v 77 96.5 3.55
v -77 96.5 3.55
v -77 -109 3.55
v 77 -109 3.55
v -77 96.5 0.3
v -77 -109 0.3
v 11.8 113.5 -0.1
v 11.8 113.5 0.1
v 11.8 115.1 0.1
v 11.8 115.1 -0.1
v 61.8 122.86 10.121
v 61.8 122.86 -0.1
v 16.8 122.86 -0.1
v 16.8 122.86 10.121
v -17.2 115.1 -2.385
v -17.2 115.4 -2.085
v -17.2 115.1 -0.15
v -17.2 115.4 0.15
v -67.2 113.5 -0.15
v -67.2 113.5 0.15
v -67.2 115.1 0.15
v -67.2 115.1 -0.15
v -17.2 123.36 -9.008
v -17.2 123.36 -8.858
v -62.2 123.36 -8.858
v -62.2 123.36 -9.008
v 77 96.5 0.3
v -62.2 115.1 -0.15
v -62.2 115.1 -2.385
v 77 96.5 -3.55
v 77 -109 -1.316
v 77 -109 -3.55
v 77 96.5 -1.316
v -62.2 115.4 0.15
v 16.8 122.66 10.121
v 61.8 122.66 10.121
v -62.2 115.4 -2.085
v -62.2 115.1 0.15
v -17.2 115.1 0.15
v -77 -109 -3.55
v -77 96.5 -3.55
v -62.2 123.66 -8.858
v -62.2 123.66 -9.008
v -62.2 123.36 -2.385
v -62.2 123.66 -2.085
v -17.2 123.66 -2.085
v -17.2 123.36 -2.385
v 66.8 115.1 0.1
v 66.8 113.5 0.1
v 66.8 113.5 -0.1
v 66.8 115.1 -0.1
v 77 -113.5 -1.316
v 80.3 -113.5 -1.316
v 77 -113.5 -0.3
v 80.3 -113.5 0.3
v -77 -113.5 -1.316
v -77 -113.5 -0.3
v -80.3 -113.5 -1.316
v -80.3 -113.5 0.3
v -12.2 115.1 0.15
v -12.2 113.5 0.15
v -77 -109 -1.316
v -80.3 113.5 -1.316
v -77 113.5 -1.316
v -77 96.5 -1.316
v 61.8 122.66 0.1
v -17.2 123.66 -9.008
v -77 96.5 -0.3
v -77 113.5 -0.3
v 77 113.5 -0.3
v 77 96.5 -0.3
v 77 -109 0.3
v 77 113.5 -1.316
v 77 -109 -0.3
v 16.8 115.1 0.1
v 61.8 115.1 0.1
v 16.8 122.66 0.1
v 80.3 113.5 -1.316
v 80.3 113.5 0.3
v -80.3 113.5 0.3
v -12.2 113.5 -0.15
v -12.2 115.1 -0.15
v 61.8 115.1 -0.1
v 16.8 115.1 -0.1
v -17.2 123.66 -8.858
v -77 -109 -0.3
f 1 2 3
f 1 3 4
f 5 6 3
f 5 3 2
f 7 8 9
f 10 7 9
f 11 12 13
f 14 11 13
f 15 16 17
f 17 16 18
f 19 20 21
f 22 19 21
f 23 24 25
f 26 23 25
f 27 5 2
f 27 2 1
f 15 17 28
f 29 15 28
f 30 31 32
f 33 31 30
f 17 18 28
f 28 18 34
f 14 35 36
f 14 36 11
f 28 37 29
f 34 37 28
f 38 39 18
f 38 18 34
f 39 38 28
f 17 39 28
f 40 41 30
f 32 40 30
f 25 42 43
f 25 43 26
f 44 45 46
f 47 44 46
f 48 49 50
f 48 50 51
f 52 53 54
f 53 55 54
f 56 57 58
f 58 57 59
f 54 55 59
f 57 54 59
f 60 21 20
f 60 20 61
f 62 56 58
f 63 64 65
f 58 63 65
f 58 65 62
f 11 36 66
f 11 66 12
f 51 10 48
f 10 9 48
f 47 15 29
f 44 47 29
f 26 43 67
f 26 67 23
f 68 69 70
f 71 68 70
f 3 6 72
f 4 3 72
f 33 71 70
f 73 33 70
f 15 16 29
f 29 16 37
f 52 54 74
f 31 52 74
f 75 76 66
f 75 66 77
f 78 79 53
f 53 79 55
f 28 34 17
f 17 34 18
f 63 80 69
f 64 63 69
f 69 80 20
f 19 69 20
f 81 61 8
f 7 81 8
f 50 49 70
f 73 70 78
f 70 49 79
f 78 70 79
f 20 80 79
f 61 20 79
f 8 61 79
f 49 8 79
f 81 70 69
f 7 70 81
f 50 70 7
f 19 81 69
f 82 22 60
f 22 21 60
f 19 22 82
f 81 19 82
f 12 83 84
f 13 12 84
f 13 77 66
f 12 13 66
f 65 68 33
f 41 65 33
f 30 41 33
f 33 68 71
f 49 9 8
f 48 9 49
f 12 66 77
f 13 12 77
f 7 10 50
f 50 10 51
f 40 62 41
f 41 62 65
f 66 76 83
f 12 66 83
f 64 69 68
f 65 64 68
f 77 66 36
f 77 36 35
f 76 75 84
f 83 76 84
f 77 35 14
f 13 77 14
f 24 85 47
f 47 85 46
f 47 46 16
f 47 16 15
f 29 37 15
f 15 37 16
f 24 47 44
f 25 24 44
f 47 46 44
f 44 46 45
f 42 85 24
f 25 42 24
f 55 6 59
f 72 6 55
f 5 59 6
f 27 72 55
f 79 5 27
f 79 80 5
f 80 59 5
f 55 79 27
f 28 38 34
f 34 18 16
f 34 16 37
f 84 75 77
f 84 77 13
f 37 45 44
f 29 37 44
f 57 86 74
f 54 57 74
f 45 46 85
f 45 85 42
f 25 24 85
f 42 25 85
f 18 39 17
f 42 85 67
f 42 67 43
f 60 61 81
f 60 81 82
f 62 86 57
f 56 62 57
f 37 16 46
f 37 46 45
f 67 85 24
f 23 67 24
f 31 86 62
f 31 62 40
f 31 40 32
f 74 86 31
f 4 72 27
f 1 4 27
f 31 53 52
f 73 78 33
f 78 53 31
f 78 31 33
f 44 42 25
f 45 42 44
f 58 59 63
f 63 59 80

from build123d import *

# Parameters (mm, degrees)
SKETCH1_W                    = 160.6
SKETCH1_H                    = 227
INSULATION_DEPTH             = 0.3
INSULATION_DEPTH_BACK        = 0.3
SKETCH2_W                    = 154
SKETCH2_H                    = 205.5
MAIN_BODY_DEPTH              = 3.55
MAIN_BODY_DEPTH_BACK         = 3.55
SIDE_FOLDS_DEPTH             = 1.016
SKETCH6_W                    = 55
SKETCH6_H                    = 18.6
NEGATIVE_TAB_BASE_DEPTH      = 0.1
NEGATIVE_TAB_BASE_DEPTH_BACK = 0.1
SKETCH7_W                    = 55
SKETCH7_H                    = 18.6
POSITIVE_TAB_BASE_DEPTH      = 0.15
POSITIVE_TAB_BASE_DEPTH_BACK = 0.15
SKETCH113_W                  = 0.2
SKETCH113_H                  = 45
NEGATIVE_TAB_DEPTH           = 31.160222221
SKETCH113_ON_SEGMENT_2_W     = 0.2
SKETCH113_ON_SEGMENT_2_H     = 45
NEGATIVE_TAB_2_DEPTH         = 33.621222221
SKETCH110_W                  = 0.3
SKETCH110_H                  = 45
POSITIVE_TAB_DEPTH           = 23.650499994
SKETCH110_ON_SEGMENT_2_W     = 0.3
SKETCH110_ON_SEGMENT_2_H     = 45
POSITIVE_TAB_2_DEPTH         = 49.236449989
SKETCH110_ON_SEGMENT_3_W     = 0.3
SKETCH110_ON_SEGMENT_3_H     = 45
POSITIVE_TAB_3_DEPTH         = 55.260999989
SKETCH110_ON_SEGMENT_4_W     = 0.3
SKETCH110_ON_SEGMENT_4_H     = 45
POSITIVE_TAB_4_DEPTH         = 31.122574994
SKETCH110_ON_SEGMENT_5_W     = 0.3
SKETCH110_ON_SEGMENT_5_H     = 45
POSITIVE_TAB_5_DEPTH         = 1.15


with BuildPart() as part:
    # Sketch1 → Insulation (new, two sides)
    with BuildSketch(Plane.XY) as insulation_sk:
        Rectangle(SKETCH1_W, SKETCH1_H)
    extrude(amount=INSULATION_DEPTH)
    extrude(insulation_sk.sketch, amount=-INSULATION_DEPTH_BACK)

    # Sketch2 → Main Body (add, two sides)
    with BuildSketch(Plane.XY) as main_body_sk:
        with Locations((0, -6.25)):
            Rectangle(SKETCH2_W, SKETCH2_H)
    extrude(amount=MAIN_BODY_DEPTH)
    extrude(main_body_sk.sketch, amount=-MAIN_BODY_DEPTH_BACK)

    # Sketch5 → Side Folds (add)
    with BuildSketch(Plane(origin=(0, 0, -0.3), x_dir=(-1, 0, 0), z_dir=(0, 0, -1))):
        Polygon((-77, -109), (-77, 96.5), (-77, 113.5), (-80.3, 113.5), (-80.3, -113.5), (-77, -113.5), align=None)
        Polygon((77, 113.5), (77, 96.5), (77, -109), (77, -113.5), (80.3, -113.5), (80.3, 113.5), align=None)
    extrude(amount=SIDE_FOLDS_DEPTH)

    # Sketch6 → Negative Tab Base (add, two sides)
    with BuildSketch(Plane.XY) as negative_tab_base_sk:
        with Locations((39.3, 105.8)):
            Rectangle(SKETCH6_W, SKETCH6_H)
    extrude(amount=NEGATIVE_TAB_BASE_DEPTH)
    extrude(negative_tab_base_sk.sketch, amount=-NEGATIVE_TAB_BASE_DEPTH_BACK)

    # Sketch7 → Positive Tab Base (add, two sides)
    with BuildSketch(Plane.XY) as positive_tab_base_sk:
        with Locations((-39.7, 105.8)):
            Rectangle(SKETCH7_W, SKETCH7_H)
    extrude(amount=POSITIVE_TAB_BASE_DEPTH)
    extrude(positive_tab_base_sk.sketch, amount=-POSITIVE_TAB_BASE_DEPTH_BACK)


with BuildPart() as body_2:
    # Sketch113 → Negative Tab (new body)
    with BuildSketch(Plane(origin=(39.3, 115.1, 0), x_dir=(0, 0, -1), z_dir=(0, 1, 0))):
        Rectangle(SKETCH113_W, SKETCH113_H)
    extrude(amount=NEGATIVE_TAB_DEPTH)

    # Negative Tab mitre 1
    split(bisect_by=Plane(origin=(39.3, 122.76, 0), x_dir=(1, 0, 0), z_dir=(0, -0.707106781, -0.707106781)), keep=Keep.TOP)


with BuildPart() as body_3:
    # Sketch113 on segment 2 (carried to segment 2) → Negative Tab 2 (new body)
    with BuildSketch(Plane(origin=(39.3, 122.76, -23.500222221), x_dir=(0, 1, 0), z_dir=(0, 0, 1))):
        Rectangle(SKETCH113_ON_SEGMENT_2_W, SKETCH113_ON_SEGMENT_2_H)
    extrude(amount=NEGATIVE_TAB_2_DEPTH)

    # Negative Tab 2 mitre 1
    split(bisect_by=Plane(origin=(39.3, 122.76, 0), x_dir=(-1, 0, 0), z_dir=(0, 0.707106781, 0.707106781)), keep=Keep.TOP)


with BuildPart() as body_4:
    # Sketch110 → Positive Tab (new body)
    with BuildSketch(Plane(origin=(-39.7, 115.1, 0), x_dir=(0, 0, -1), z_dir=(0, 1, 0))):
        Rectangle(SKETCH110_W, SKETCH110_H)
    extrude(amount=POSITIVE_TAB_DEPTH)

    # Positive Tab mitre 1
    split(bisect_by=Plane(origin=(-39.7, 115.25, 0), x_dir=(1, 0, 0), z_dir=(0, -0.707106781, 0.707106781)), keep=Keep.TOP)


with BuildPart() as body_5:
    # Sketch110 on segment 2 (carried to segment 2) → Positive Tab 2 (new body)
    with BuildSketch(Plane(origin=(-39.7, 115.25, 23.500499994), x_dir=(0, -1, 0), z_dir=(0, 0, -1))):
        Rectangle(SKETCH110_ON_SEGMENT_2_W, SKETCH110_ON_SEGMENT_2_H)
    extrude(amount=POSITIVE_TAB_2_DEPTH)

    # Positive Tab 2 mitre 1
    split(bisect_by=Plane(origin=(-39.7, 115.25, 0), x_dir=(-1, 0, 0), z_dir=(0, 0.707106781, -0.707106781)), keep=Keep.TOP)

    # Positive Tab 2 mitre 2
    split(bisect_by=Plane(origin=(-39.7, 115.25, -2.23545), x_dir=(1, 0, 0), z_dir=(0, -0.707106781, 0.707106781)), keep=Keep.TOP)


with BuildPart() as body_6:
    # Sketch110 on segment 3 (carried to segment 3) → Positive Tab 3 (new body)
    with BuildSketch(Plane(origin=(-39.7, 91.749500006, -2.23545), x_dir=(0, 0, -1), z_dir=(0, 1, 0))):
        Rectangle(SKETCH110_ON_SEGMENT_3_W, SKETCH110_ON_SEGMENT_3_H)
    extrude(amount=POSITIVE_TAB_3_DEPTH)

    # Positive Tab 3 mitre 1
    split(bisect_by=Plane(origin=(-39.7, 115.25, -2.23545), x_dir=(-1, 0, 0), z_dir=(0, 0.707106781, -0.707106781)), keep=Keep.TOP)

    # Positive Tab 3 mitre 2
    split(bisect_by=Plane(origin=(-39.7, 123.51, -2.23545), x_dir=(1, 0, 0), z_dir=(0, -0.707106781, 0.707106781)), keep=Keep.TOP)


with BuildPart() as body_7:
    # Sketch110 on segment 4 (carried to segment 4) → Positive Tab 4 (new body)
    with BuildSketch(Plane(origin=(-39.7, 123.51, 21.265049994), x_dir=(0, -1, 0), z_dir=(0, 0, -1))):
        Rectangle(SKETCH110_ON_SEGMENT_4_W, SKETCH110_ON_SEGMENT_4_H)
    extrude(amount=POSITIVE_TAB_4_DEPTH)

    # Positive Tab 4 mitre 1
    split(bisect_by=Plane(origin=(-39.7, 123.51, -2.23545), x_dir=(-1, 0, 0), z_dir=(0, 0.707106781, -0.707106781)), keep=Keep.TOP)

    # Positive Tab 4 mitre 2
    split(bisect_by=Plane(origin=(-39.7, 123.51, -8.857525), x_dir=(0, -1, 0), z_dir=(0, 0, 1)), keep=Keep.TOP)


with BuildPart() as body_8:
    # Sketch110 on segment 5 (carried to segment 5) → Positive Tab 5 (new body)
    with BuildSketch(Plane(origin=(-39.7, 123.51, -7.857525), x_dir=(0, -1, 0), z_dir=(0, 0, -1))):
        Rectangle(SKETCH110_ON_SEGMENT_5_W, SKETCH110_ON_SEGMENT_5_H)
    extrude(amount=POSITIVE_TAB_5_DEPTH)

    # Positive Tab 5 mitre 1
    split(bisect_by=Plane(origin=(-39.7, 123.51, -8.857525), x_dir=(0, 1, 0), z_dir=(0, 0, -1)), keep=Keep.TOP)


solid = Compound([part.part, body_2.part, body_3.part, body_4.part, body_5.part, body_6.part, body_7.part, body_8.part])
